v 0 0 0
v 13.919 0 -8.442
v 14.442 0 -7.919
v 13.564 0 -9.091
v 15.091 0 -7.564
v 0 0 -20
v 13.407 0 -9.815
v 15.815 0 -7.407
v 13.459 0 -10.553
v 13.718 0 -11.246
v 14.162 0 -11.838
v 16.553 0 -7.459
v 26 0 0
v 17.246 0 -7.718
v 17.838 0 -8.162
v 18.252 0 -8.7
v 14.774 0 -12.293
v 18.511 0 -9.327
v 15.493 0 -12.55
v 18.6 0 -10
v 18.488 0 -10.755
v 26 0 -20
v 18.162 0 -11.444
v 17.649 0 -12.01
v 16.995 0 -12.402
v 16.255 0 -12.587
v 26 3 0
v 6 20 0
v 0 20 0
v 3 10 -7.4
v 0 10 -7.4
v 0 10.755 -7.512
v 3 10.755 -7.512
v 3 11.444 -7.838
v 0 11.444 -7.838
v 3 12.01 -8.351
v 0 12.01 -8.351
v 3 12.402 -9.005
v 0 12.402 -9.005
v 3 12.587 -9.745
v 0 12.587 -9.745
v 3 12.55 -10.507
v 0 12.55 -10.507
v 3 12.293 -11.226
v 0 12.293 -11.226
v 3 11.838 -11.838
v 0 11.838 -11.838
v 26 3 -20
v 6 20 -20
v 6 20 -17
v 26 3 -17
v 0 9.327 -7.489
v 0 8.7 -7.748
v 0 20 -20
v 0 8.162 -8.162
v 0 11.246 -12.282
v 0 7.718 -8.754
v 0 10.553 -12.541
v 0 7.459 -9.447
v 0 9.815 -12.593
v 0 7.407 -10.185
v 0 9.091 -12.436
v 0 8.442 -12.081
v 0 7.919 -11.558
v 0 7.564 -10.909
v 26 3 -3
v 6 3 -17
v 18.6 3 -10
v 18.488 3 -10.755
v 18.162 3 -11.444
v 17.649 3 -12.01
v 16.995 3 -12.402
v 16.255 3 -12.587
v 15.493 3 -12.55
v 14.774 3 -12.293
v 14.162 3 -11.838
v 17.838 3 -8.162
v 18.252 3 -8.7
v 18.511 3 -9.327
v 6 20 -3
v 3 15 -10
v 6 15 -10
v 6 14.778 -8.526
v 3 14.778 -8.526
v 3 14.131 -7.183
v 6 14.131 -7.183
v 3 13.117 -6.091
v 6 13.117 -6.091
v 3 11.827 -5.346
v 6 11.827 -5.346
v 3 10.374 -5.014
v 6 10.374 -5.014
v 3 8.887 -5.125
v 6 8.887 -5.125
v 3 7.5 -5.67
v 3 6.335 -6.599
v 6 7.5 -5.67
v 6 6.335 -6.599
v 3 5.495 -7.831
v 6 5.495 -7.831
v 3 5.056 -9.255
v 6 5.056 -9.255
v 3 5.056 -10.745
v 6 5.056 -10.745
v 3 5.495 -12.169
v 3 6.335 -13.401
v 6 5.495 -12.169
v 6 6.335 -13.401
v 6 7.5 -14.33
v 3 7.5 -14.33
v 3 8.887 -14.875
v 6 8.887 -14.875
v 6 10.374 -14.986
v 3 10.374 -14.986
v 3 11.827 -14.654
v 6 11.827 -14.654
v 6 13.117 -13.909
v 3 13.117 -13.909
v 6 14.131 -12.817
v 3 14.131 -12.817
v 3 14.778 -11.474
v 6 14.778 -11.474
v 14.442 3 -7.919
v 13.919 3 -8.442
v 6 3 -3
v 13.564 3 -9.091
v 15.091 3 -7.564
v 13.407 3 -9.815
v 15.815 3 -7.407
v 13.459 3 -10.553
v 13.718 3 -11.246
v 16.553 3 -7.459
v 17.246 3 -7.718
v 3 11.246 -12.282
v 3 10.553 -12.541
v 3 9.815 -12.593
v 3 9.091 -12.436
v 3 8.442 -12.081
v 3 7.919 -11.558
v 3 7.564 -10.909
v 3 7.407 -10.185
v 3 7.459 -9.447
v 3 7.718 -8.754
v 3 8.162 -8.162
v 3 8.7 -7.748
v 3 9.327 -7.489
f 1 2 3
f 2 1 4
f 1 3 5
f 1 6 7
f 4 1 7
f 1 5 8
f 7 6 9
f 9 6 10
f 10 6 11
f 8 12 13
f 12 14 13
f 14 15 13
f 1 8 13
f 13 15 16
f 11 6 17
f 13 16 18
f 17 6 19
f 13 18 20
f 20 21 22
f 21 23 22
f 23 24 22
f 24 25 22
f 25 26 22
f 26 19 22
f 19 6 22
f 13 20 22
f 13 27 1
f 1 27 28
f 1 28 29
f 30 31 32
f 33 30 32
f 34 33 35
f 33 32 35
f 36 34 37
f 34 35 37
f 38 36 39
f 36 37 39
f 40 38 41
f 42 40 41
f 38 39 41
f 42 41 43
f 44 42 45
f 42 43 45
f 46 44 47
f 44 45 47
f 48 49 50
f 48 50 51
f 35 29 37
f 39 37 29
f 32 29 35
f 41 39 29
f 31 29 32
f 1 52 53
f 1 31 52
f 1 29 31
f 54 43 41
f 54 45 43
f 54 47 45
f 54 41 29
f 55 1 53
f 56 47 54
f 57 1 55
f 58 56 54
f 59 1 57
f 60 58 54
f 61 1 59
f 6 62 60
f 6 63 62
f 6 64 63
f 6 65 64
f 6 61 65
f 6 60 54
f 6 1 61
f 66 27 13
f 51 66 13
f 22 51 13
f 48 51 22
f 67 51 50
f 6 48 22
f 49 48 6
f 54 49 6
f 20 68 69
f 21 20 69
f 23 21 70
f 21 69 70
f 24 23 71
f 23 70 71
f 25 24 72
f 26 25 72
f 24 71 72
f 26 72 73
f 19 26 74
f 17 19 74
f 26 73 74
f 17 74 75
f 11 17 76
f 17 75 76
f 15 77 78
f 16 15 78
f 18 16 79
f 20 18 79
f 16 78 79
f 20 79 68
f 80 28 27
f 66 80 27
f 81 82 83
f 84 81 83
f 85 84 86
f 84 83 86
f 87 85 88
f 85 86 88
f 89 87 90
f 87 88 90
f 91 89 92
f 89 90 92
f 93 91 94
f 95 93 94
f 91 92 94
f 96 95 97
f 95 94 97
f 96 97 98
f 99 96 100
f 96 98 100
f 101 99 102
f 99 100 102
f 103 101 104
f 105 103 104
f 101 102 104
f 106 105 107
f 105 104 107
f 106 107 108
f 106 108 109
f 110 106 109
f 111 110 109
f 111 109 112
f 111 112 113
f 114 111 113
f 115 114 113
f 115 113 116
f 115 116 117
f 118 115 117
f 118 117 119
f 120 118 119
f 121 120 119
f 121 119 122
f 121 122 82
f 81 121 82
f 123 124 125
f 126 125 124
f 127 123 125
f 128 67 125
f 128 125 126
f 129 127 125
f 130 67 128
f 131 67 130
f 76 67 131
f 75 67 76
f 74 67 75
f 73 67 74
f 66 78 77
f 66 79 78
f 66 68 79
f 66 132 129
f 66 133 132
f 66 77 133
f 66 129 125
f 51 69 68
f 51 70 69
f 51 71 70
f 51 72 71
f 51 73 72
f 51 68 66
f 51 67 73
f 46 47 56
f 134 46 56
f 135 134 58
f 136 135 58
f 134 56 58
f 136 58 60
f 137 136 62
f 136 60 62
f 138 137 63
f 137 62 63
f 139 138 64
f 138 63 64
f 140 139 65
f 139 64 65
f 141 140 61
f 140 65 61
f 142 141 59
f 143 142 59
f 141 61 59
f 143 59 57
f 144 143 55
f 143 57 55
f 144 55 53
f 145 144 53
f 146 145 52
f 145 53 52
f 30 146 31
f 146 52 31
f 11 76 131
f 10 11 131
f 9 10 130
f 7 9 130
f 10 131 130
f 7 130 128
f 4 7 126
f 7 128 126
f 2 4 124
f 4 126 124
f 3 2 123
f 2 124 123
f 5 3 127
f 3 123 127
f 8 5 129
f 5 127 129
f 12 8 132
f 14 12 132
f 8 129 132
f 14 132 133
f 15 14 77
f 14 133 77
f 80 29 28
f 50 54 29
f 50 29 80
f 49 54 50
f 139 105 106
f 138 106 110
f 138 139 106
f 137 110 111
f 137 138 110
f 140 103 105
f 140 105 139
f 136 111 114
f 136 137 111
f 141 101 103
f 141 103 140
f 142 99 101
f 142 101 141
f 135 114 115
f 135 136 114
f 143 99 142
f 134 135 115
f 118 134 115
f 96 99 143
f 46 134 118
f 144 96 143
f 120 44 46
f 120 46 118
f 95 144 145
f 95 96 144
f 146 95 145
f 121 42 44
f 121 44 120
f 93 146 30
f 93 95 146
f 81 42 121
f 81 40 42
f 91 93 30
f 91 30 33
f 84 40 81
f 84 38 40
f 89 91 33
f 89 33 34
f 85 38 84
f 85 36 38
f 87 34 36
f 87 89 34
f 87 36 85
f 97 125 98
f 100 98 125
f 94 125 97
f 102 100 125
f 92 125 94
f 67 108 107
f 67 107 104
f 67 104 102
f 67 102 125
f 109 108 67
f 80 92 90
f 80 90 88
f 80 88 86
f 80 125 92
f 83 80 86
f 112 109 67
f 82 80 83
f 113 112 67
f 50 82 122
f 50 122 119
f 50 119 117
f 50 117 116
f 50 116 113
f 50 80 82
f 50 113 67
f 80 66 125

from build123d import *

# Parameters (mm, degrees)
SKETCH_1_W          = 40
SKETCH_1_H          = 20
EXTRUDE_1_DEPTH     = 20
SKETCH_2_W          = 34
SKETCH_2_H          = 14
CUT_EXTRUDE_1_DEPTH = 20
CUT_EXTRUDE_2_DEPTH = 20
SKETCH_5_R          = 5
CUT_EXTRUDE_3_DEPTH = 3
SKETCH_6_W          = 34
SKETCH_6_H          = 20
CUT_EXTRUDE_4_DEPTH = 3
SKETCH_7_W          = 14
SKETCH_7_H          = 20
CUT_EXTRUDE_5_DEPTH = 3
EXTRUDE_2_DEPTH     = 3
EXTRUDE_3_DEPTH     = 3


with BuildPart() as part:
    # 草图1 → 凸台-拉伸1 (new body)
    with BuildSketch(Plane(origin=(0, 0, 0), x_dir=(1, 0, 0), z_dir=(0, 1, 0))):
        with Locations((20, 10)):
            Rectangle(SKETCH_1_W, SKETCH_1_H)
    extrude(amount=EXTRUDE_1_DEPTH)

    # 草图2 → 切除-拉伸1 (cut)
    with BuildSketch(Plane.XY):
        with Locations((23, 13)):
            Rectangle(SKETCH_2_W, SKETCH_2_H)
    extrude(amount=-CUT_EXTRUDE_1_DEPTH, mode=Mode.SUBTRACT)

    # 草图4 → 切除-拉伸2 (cut)
    with BuildSketch(Plane.ZY):
        with BuildLine():
            ThreePointArc((-7.4, 10), (-9.005023076, 12.402086785), (-11.838477631, 11.838477631))
            Line((-11.838477631, 11.838477631), (-8.161522369, 8.161522369))
            ThreePointArc((-8.161522369, 8.161522369), (-7.597913215, 9.005023076), (-7.4, 10))
        make_face()
        with BuildLine():
            Line((-8.161522369, 8.161522369), (-11.838477631, 11.838477631))
            ThreePointArc((-11.838477631, 11.838477631), (-11.838477631, 8.161522369), (-8.161522369, 8.161522369))
        make_face()
    extrude(amount=-CUT_EXTRUDE_2_DEPTH, mode=Mode.SUBTRACT)

    # 草图5 → 切除-拉伸3 (cut)
    with BuildSketch(Plane(origin=(6, 0, 0), x_dir=(0, 0, -1), z_dir=(1, 0, 0))):
        with Locations(Location((10, 10, 0), (0, 0, 90))):
            Circle(SKETCH_5_R)
    extrude(amount=-CUT_EXTRUDE_3_DEPTH, mode=Mode.SUBTRACT)

    # 草图6 → 切除-拉伸4 (cut)
    with BuildSketch(Plane(origin=(0, 6, 0), x_dir=(1, 0, 0), z_dir=(0, 1, 0))):
        with Locations((23, 10)):
            Rectangle(SKETCH_6_W, SKETCH_6_H)
    extrude(amount=-CUT_EXTRUDE_4_DEPTH, mode=Mode.SUBTRACT)

    # 草图7 → 切除-拉伸5 (cut)
    with BuildSketch(Plane(origin=(0, 3, 0), x_dir=(1, 0, 0), z_dir=(0, 1, 0))):
        with Locations((33, 10)):
            Rectangle(SKETCH_7_W, SKETCH_7_H)
        with BuildLine():
            ThreePointArc((18.6, 10), (16.994976924, 12.402086785), (14.161522369, 11.838477631))
            Line((14.161522369, 11.838477631), (17.838477631, 8.161522369))
            ThreePointArc((17.838477631, 8.161522369), (18.402086785, 9.005023076), (18.6, 10))
        make_face()
        with BuildLine():
            Line((17.838477631, 8.161522369), (14.161522369, 11.838477631))
            ThreePointArc((14.161522369, 11.838477631), (14.161522369, 8.161522369), (17.838477631, 8.161522369))
        make_face()
    extrude(amount=-CUT_EXTRUDE_5_DEPTH, mode=Mode.SUBTRACT)

    # 草图9 → 凸台-拉伸2 (add)
    with BuildSketch(Plane.XY):
        Polygon((6, 20), (26, 3), (6, 3), align=None)
    extrude(amount=-EXTRUDE_2_DEPTH)

    # 草图10 → 凸台-拉伸3 (add)
    with BuildSketch(Plane(origin=(0, 0, -20), x_dir=(-1, 0, 0), z_dir=(0, 0, -1))):
        Polygon((-26, 3), (-6, 3), (-6, 20), align=None)
    extrude(amount=-EXTRUDE_3_DEPTH)


solid = part.part
